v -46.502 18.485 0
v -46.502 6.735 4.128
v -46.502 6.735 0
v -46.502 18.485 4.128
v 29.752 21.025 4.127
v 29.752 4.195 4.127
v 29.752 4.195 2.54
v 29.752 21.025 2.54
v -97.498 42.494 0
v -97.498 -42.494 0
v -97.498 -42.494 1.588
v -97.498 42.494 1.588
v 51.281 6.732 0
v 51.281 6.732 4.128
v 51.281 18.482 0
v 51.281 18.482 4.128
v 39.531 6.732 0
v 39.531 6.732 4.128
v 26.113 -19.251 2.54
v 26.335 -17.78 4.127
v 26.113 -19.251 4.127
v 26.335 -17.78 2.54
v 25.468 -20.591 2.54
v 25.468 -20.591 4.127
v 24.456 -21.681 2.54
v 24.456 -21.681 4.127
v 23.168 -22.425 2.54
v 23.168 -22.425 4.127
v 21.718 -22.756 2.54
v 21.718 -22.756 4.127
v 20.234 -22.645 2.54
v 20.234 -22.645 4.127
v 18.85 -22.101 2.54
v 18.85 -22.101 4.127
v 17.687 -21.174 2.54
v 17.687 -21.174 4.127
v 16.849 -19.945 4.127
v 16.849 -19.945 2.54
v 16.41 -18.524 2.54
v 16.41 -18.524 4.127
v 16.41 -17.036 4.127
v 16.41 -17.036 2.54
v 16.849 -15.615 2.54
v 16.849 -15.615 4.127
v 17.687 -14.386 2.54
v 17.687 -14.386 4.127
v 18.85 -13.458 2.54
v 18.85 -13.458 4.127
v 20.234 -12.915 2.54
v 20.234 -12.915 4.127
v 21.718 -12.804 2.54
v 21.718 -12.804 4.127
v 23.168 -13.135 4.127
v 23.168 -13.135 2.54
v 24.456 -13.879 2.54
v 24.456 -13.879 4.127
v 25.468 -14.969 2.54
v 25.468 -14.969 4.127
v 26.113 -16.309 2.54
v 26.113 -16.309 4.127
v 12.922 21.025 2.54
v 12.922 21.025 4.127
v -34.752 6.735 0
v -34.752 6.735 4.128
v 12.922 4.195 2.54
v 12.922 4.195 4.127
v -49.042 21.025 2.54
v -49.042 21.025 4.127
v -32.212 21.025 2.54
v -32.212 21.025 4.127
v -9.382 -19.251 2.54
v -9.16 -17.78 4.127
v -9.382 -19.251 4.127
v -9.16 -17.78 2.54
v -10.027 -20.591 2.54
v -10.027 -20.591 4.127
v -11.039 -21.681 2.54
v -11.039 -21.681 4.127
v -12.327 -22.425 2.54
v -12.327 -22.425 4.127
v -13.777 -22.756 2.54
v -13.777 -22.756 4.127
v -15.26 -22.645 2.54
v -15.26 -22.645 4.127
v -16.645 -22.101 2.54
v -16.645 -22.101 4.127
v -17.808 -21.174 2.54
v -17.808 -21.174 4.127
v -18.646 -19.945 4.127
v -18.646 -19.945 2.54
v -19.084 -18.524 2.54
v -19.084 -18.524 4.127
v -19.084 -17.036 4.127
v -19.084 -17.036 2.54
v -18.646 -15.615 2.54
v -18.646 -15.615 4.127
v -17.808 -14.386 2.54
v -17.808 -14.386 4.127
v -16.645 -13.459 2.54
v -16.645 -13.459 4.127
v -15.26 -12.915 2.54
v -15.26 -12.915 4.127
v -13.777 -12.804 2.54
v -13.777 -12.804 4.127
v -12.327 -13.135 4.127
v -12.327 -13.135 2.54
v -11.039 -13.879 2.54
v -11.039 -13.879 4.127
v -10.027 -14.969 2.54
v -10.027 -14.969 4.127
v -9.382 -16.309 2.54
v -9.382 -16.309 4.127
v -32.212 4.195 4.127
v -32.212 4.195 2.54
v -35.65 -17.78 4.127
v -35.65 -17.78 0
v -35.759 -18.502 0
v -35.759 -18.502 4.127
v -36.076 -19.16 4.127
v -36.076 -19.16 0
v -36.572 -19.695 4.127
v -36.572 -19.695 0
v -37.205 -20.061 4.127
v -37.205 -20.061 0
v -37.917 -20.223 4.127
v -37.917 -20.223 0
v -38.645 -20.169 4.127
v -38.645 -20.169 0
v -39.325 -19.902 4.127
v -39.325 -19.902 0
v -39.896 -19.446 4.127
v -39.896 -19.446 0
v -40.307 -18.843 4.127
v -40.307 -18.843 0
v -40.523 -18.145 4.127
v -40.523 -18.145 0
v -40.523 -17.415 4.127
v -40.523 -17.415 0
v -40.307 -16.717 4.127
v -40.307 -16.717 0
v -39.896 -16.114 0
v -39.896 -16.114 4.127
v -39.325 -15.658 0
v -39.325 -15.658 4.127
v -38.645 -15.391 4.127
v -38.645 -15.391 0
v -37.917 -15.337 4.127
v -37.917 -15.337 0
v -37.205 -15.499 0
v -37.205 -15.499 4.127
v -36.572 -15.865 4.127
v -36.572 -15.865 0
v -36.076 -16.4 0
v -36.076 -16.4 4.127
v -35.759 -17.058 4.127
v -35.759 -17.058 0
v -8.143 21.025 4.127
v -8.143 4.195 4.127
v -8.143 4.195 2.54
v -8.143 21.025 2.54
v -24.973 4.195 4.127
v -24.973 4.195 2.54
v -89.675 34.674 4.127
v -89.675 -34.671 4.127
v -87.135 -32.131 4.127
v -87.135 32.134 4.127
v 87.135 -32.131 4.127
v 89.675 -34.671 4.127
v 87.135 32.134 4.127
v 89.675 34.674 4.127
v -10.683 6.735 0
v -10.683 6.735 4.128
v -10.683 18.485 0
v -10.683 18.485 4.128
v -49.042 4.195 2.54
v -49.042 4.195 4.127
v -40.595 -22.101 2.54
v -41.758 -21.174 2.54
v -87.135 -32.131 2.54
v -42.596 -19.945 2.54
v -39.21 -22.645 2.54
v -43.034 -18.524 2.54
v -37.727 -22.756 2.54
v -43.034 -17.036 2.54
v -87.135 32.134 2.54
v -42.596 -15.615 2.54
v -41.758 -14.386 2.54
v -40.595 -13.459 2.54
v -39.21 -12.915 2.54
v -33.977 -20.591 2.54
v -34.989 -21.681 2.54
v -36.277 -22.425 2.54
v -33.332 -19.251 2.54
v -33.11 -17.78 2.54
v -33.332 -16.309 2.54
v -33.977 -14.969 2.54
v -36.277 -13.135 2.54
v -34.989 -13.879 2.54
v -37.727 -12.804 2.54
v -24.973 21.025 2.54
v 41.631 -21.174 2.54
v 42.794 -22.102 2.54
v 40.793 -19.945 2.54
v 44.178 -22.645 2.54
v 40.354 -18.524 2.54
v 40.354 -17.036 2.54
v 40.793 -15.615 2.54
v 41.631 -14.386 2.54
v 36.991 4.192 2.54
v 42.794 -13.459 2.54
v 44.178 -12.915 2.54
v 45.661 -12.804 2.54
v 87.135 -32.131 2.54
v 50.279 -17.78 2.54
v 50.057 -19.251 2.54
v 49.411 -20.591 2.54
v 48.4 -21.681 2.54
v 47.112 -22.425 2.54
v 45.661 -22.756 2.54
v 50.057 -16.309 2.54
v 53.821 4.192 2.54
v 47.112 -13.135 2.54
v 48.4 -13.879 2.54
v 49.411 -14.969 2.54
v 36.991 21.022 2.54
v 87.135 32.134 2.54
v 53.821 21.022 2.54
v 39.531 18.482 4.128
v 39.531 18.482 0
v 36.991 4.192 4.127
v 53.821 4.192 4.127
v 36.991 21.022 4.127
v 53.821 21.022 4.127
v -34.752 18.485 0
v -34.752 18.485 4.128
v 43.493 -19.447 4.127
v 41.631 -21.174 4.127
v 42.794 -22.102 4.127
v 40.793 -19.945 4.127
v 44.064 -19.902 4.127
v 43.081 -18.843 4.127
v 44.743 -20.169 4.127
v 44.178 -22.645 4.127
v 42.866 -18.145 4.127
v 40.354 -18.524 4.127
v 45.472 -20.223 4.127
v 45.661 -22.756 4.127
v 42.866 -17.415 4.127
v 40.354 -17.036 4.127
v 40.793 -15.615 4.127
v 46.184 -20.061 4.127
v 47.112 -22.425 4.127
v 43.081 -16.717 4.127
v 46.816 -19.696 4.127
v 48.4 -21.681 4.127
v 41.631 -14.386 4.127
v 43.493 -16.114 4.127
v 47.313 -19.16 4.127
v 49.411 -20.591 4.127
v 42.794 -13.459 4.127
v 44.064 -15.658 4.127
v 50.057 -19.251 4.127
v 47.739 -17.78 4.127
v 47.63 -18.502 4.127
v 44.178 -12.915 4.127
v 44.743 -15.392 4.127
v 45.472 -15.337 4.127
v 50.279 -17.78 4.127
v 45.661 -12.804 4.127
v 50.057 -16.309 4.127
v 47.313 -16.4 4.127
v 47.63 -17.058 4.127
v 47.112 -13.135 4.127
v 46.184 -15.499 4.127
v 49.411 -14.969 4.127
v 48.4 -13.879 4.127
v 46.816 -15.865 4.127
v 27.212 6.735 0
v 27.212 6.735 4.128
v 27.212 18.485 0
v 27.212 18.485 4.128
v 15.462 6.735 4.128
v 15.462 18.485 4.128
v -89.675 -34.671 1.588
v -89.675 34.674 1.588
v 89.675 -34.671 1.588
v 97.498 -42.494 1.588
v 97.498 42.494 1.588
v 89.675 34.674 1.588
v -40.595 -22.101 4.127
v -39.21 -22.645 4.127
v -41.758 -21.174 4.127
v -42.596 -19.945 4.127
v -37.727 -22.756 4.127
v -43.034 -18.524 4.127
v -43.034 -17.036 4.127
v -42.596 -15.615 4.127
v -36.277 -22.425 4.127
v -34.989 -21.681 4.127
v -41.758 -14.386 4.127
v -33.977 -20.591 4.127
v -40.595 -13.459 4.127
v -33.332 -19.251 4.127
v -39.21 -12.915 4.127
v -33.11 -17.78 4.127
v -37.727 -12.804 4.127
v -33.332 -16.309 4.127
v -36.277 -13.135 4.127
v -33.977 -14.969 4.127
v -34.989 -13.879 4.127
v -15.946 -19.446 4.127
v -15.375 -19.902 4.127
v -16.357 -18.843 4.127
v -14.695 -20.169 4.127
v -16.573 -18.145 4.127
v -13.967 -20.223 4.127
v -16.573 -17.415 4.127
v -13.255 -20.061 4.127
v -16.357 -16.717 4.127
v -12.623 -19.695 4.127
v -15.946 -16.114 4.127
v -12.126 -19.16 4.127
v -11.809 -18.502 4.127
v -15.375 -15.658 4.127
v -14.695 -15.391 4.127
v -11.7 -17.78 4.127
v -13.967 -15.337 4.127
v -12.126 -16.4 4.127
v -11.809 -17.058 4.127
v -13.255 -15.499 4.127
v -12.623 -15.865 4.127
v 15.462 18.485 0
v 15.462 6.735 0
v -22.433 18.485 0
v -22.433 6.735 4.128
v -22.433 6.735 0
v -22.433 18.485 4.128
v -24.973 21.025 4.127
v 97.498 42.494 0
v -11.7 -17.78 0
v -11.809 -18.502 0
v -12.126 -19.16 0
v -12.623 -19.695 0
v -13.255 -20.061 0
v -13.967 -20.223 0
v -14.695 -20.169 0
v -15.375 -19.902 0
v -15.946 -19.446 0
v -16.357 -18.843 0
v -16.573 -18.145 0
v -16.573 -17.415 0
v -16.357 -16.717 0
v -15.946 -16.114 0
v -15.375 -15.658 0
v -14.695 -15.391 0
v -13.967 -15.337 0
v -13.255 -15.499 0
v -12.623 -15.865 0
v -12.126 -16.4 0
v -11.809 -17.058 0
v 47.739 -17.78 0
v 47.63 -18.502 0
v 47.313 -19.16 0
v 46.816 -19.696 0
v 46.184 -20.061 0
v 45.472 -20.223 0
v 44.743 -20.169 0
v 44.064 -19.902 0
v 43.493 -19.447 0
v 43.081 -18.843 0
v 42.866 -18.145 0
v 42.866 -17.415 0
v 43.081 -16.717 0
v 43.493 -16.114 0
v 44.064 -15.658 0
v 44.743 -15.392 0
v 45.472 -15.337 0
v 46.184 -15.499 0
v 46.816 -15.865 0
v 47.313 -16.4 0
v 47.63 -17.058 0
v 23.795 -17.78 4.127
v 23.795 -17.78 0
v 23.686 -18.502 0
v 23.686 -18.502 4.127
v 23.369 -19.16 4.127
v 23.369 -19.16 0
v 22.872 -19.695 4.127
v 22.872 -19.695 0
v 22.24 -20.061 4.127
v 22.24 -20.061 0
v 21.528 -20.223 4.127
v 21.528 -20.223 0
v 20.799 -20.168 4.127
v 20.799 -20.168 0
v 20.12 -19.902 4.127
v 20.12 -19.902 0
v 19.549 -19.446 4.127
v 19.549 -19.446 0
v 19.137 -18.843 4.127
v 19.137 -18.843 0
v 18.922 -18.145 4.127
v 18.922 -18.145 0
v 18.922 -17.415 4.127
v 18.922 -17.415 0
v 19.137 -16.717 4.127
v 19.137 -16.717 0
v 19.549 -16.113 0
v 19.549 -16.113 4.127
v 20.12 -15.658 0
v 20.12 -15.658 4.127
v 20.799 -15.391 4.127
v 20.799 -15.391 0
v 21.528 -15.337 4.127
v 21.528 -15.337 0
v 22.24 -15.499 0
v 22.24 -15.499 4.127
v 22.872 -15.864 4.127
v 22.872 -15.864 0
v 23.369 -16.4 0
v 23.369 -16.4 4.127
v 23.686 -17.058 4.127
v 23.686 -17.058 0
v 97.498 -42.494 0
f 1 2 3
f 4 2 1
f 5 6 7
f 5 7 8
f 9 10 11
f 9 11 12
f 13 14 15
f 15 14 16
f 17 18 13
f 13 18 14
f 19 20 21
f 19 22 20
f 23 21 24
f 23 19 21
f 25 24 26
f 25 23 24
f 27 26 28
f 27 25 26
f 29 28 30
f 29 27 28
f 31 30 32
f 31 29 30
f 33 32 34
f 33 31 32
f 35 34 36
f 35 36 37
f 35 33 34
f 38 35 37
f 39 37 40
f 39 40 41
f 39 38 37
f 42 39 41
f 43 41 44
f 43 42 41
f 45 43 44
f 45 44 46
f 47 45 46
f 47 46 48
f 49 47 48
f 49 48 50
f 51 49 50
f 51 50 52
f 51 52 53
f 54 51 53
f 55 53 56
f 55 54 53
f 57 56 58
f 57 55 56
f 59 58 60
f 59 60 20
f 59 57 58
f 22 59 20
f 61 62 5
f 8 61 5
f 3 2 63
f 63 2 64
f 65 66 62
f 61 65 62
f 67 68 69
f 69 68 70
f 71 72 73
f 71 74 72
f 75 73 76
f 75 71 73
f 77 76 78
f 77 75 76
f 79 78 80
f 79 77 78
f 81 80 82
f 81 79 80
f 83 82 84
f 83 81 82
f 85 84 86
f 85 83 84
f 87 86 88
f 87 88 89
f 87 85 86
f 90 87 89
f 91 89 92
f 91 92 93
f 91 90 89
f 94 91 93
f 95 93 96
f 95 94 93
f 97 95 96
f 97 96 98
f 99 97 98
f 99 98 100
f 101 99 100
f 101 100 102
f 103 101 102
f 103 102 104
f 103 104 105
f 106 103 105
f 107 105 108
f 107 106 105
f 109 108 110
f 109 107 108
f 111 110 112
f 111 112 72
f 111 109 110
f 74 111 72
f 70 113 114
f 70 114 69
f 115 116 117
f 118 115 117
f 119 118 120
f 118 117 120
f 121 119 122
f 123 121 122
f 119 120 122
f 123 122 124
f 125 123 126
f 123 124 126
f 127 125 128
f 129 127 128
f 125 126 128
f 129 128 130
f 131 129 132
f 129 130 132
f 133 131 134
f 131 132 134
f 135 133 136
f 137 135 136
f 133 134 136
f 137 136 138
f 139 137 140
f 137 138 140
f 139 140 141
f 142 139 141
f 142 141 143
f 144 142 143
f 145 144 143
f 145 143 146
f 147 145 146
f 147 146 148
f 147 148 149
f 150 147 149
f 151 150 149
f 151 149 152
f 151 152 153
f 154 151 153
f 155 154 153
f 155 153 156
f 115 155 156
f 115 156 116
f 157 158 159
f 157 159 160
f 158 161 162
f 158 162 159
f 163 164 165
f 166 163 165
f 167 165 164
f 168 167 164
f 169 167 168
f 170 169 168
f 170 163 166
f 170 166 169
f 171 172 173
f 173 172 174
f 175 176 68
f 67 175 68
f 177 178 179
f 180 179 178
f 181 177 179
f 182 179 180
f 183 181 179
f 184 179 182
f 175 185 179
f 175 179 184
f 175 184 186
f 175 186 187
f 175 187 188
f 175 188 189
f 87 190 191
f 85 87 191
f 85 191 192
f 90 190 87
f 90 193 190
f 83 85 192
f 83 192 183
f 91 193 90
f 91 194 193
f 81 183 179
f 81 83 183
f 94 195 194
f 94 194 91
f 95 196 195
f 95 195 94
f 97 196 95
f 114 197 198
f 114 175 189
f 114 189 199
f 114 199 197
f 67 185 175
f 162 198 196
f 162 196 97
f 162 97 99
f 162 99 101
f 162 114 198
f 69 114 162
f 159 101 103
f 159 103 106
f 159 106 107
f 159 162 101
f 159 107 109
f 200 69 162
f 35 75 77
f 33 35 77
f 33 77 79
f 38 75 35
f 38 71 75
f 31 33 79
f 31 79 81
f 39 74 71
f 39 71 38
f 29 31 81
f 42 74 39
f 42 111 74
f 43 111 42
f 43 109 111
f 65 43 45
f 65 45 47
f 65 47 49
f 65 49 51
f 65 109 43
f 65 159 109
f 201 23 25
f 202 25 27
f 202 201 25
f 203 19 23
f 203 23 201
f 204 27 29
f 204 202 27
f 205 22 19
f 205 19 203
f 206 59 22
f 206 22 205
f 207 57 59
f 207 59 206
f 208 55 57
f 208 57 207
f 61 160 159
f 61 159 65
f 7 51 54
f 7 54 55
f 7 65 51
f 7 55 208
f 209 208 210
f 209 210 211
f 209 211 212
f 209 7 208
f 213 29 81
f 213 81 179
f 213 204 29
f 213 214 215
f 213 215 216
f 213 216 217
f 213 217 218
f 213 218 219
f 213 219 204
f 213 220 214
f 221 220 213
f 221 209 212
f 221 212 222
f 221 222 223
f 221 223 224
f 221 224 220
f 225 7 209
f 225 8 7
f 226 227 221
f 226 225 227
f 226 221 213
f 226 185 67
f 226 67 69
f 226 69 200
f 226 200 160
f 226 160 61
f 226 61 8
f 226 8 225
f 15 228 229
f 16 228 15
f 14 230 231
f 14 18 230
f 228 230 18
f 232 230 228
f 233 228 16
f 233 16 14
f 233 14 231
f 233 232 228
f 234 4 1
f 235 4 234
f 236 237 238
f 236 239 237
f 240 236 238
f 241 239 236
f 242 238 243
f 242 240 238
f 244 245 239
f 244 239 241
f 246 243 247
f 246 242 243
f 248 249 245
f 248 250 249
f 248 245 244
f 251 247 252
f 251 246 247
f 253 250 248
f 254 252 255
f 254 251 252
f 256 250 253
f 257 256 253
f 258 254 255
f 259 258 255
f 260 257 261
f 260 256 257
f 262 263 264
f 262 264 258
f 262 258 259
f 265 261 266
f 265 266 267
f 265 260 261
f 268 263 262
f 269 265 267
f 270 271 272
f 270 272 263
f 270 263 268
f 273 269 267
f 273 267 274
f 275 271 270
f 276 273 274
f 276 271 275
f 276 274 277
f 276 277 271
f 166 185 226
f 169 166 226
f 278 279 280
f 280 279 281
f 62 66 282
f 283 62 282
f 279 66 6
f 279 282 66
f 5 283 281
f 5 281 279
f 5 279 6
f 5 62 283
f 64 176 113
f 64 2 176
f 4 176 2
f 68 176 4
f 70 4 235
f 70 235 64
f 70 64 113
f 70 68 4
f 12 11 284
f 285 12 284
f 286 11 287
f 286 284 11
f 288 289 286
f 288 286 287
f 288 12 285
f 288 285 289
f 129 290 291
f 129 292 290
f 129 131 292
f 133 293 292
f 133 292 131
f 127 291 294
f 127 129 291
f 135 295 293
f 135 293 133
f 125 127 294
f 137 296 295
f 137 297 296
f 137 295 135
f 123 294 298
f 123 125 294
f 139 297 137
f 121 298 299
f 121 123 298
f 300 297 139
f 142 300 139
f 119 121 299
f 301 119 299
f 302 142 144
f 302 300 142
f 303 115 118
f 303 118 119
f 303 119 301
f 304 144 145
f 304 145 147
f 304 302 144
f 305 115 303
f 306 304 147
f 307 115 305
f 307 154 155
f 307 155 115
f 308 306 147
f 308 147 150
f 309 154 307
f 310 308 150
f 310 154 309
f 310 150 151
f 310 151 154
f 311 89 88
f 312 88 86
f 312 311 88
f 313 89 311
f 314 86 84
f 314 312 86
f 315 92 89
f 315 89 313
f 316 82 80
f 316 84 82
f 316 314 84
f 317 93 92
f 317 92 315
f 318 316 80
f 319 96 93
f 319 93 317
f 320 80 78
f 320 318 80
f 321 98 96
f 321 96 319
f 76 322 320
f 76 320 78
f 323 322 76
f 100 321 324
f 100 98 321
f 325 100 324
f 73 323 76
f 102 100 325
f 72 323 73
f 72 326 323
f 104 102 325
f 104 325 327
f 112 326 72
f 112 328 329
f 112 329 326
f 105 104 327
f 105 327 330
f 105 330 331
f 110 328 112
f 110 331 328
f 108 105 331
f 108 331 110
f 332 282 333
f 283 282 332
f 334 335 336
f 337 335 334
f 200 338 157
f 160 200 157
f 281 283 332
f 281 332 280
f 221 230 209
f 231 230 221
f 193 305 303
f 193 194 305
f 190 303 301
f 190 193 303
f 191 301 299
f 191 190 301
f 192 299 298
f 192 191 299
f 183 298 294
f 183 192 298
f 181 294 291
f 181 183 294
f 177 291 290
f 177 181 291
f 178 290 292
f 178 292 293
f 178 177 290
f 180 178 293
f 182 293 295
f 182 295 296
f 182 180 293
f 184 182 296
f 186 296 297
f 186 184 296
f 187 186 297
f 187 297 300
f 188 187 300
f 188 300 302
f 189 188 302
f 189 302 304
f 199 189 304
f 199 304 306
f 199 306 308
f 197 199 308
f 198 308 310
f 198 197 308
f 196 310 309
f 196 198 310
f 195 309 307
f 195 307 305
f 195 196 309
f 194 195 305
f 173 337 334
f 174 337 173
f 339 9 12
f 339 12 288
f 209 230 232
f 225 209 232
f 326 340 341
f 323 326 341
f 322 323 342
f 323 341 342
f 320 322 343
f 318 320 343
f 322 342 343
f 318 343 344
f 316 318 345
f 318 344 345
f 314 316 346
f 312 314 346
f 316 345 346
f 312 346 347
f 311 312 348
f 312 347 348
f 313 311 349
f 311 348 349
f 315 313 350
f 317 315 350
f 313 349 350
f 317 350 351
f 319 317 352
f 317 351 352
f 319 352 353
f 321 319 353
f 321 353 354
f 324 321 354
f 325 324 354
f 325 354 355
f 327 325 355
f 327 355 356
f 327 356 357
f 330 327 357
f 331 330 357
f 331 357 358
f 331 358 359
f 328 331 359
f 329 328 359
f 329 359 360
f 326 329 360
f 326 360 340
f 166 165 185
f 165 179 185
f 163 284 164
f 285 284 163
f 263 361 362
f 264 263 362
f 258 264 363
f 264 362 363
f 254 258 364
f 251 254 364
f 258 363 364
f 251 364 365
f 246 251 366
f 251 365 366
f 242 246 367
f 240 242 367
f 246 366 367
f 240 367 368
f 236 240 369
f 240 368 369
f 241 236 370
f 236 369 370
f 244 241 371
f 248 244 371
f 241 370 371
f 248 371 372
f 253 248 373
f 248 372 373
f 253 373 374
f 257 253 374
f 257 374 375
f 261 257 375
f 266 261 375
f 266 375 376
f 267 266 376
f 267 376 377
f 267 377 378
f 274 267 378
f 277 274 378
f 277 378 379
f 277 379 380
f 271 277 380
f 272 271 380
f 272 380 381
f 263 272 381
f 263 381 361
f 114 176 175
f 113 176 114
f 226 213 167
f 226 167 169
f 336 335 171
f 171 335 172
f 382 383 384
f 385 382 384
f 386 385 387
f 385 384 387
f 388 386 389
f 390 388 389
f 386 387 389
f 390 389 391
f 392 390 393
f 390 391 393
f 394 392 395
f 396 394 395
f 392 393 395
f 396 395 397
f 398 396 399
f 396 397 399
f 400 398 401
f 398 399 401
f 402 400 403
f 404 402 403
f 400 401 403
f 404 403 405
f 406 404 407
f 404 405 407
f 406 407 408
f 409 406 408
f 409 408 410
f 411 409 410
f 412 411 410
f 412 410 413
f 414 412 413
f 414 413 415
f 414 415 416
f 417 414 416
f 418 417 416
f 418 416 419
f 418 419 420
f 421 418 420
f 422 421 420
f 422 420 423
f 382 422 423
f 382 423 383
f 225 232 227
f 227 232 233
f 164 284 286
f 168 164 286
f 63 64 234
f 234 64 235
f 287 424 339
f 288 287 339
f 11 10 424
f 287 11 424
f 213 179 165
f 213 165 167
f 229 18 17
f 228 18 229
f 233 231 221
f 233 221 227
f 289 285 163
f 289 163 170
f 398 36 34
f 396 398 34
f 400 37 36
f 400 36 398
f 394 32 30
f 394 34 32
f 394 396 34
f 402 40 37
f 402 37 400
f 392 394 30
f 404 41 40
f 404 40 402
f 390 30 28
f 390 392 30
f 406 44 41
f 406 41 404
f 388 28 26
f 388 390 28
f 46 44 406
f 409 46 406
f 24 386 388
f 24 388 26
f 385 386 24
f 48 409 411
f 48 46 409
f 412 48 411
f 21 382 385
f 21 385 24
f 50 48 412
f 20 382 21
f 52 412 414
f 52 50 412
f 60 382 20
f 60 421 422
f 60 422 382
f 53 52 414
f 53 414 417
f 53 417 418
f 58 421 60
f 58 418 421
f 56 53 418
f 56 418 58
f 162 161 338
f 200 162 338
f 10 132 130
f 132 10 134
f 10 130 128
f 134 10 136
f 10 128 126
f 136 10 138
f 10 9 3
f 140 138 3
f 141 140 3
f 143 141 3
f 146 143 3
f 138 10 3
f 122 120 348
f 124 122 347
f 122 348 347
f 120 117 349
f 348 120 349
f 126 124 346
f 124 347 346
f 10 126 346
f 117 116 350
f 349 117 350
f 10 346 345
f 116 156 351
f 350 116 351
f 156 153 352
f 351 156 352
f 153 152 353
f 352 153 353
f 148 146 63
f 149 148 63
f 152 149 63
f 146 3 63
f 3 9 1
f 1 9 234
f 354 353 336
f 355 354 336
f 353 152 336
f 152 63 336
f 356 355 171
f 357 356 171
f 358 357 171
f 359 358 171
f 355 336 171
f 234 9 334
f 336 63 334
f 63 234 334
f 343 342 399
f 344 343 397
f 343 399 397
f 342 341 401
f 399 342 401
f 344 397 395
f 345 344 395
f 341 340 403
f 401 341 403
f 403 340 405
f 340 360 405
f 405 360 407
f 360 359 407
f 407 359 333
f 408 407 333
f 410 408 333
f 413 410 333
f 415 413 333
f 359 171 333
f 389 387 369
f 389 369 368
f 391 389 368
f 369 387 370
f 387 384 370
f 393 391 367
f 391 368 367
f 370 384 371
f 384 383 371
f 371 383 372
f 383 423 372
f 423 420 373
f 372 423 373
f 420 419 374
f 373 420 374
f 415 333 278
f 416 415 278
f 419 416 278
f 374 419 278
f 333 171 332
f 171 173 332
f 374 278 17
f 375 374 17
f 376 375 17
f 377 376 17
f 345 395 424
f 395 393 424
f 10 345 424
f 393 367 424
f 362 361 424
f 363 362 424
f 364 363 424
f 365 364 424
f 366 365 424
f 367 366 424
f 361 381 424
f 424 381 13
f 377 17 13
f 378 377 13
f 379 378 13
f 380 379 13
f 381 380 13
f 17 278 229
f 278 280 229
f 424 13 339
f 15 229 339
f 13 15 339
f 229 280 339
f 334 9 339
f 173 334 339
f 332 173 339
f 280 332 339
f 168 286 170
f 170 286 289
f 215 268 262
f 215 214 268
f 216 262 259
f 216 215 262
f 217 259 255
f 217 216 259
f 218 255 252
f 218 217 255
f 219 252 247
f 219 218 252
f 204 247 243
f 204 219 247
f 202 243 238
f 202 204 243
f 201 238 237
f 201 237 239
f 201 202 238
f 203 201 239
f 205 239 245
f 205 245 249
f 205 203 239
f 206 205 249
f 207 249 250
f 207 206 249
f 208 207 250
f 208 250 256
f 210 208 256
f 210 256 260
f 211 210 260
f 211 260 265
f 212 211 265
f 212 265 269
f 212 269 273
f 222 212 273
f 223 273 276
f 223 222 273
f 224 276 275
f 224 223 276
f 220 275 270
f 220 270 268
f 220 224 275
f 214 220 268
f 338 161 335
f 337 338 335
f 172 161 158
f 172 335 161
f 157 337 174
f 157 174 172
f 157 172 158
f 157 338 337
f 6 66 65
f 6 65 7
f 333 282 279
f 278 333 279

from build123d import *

# Parameters (mm, degrees)
F0_W     = 194.9958
F0_H     = 84.9884
F1_DEPTH = 1.5875
F2_W     = 179.3494
F2_H     = 69.3452
F2_W_2   = 64.45
F2_H_2   = 11.61
F3_DEPTH = 2.54
F4_R     = 2.45
F5_DEPTH = 22.86
F6_W     = 11.75
F6_H     = 11.75
F7_DEPTH = 25.4
F8_T     = -2.54


with BuildPart() as f1:
    # F0 (on Top) → F1 (new body)
    with BuildSketch(Plane.XY):
        Rectangle(F0_W, F0_H)
    extrude(amount=F1_DEPTH)

    # F2 (on face) → F3 (join)
    with BuildSketch(Plane.XY.offset(1.5875)):
        with Locations((0, 0.0016)):
            Rectangle(F2_W, F2_H)
        with Locations((-49.5541132987, 20.0935862262)):
            Rectangle(F2_W_2, F2_H_2, mode=Mode.SUBTRACT)
        with Locations((-49.5541132987, 20.0935862262)):
            Rectangle(F2_W_2, F2_H_2)
    extrude(amount=F3_DEPTH)

    # F4 (on face) → F5 (cut)
    with BuildSketch(Plane(origin=(0, 0, 0), x_dir=(1, 0, 0), z_dir=(0, 0, -1))):
        with Locations((-38.0999999963, 17.779997108)):
            Circle(F4_R)
        with Locations((45.2885175493, 17.780080176)):
            Circle(F4_R)
        with Locations((21.3446233022, 17.7799198239)):
            Circle(F4_R)
        with Locations((-14.1500980391, 17.780002892)):
            Circle(F4_R)
    extrude(amount=-F5_DEPTH, mode=Mode.SUBTRACT)

    # F6 (on face) → F7 (cut)
    with BuildSketch(Plane.XY.offset(4.1275)):
        with Locations((45.4056928721, 12.6071161675)):
            Rectangle(F6_W, F6_H)
        with Locations((21.3366928721, 12.610067341)):
            Rectangle(F6_W, F6_H)
        with Locations((-16.5584006092, 12.610067341)):
            Rectangle(F6_W, F6_H)
        with Locations((-40.6274006092, 12.610067341)):
            Rectangle(F6_W, F6_H)
    extrude(amount=-F7_DEPTH, mode=Mode.SUBTRACT)

    # F8
    f8_openings = [f1.faces().sort_by_distance(p)[0] for p in [
        (-0.134693, -0.47441, 4.1275),
    ]]
    offset(amount=F8_T, openings=f8_openings, kind=Kind.INTERSECTION)


solid = f1.part
